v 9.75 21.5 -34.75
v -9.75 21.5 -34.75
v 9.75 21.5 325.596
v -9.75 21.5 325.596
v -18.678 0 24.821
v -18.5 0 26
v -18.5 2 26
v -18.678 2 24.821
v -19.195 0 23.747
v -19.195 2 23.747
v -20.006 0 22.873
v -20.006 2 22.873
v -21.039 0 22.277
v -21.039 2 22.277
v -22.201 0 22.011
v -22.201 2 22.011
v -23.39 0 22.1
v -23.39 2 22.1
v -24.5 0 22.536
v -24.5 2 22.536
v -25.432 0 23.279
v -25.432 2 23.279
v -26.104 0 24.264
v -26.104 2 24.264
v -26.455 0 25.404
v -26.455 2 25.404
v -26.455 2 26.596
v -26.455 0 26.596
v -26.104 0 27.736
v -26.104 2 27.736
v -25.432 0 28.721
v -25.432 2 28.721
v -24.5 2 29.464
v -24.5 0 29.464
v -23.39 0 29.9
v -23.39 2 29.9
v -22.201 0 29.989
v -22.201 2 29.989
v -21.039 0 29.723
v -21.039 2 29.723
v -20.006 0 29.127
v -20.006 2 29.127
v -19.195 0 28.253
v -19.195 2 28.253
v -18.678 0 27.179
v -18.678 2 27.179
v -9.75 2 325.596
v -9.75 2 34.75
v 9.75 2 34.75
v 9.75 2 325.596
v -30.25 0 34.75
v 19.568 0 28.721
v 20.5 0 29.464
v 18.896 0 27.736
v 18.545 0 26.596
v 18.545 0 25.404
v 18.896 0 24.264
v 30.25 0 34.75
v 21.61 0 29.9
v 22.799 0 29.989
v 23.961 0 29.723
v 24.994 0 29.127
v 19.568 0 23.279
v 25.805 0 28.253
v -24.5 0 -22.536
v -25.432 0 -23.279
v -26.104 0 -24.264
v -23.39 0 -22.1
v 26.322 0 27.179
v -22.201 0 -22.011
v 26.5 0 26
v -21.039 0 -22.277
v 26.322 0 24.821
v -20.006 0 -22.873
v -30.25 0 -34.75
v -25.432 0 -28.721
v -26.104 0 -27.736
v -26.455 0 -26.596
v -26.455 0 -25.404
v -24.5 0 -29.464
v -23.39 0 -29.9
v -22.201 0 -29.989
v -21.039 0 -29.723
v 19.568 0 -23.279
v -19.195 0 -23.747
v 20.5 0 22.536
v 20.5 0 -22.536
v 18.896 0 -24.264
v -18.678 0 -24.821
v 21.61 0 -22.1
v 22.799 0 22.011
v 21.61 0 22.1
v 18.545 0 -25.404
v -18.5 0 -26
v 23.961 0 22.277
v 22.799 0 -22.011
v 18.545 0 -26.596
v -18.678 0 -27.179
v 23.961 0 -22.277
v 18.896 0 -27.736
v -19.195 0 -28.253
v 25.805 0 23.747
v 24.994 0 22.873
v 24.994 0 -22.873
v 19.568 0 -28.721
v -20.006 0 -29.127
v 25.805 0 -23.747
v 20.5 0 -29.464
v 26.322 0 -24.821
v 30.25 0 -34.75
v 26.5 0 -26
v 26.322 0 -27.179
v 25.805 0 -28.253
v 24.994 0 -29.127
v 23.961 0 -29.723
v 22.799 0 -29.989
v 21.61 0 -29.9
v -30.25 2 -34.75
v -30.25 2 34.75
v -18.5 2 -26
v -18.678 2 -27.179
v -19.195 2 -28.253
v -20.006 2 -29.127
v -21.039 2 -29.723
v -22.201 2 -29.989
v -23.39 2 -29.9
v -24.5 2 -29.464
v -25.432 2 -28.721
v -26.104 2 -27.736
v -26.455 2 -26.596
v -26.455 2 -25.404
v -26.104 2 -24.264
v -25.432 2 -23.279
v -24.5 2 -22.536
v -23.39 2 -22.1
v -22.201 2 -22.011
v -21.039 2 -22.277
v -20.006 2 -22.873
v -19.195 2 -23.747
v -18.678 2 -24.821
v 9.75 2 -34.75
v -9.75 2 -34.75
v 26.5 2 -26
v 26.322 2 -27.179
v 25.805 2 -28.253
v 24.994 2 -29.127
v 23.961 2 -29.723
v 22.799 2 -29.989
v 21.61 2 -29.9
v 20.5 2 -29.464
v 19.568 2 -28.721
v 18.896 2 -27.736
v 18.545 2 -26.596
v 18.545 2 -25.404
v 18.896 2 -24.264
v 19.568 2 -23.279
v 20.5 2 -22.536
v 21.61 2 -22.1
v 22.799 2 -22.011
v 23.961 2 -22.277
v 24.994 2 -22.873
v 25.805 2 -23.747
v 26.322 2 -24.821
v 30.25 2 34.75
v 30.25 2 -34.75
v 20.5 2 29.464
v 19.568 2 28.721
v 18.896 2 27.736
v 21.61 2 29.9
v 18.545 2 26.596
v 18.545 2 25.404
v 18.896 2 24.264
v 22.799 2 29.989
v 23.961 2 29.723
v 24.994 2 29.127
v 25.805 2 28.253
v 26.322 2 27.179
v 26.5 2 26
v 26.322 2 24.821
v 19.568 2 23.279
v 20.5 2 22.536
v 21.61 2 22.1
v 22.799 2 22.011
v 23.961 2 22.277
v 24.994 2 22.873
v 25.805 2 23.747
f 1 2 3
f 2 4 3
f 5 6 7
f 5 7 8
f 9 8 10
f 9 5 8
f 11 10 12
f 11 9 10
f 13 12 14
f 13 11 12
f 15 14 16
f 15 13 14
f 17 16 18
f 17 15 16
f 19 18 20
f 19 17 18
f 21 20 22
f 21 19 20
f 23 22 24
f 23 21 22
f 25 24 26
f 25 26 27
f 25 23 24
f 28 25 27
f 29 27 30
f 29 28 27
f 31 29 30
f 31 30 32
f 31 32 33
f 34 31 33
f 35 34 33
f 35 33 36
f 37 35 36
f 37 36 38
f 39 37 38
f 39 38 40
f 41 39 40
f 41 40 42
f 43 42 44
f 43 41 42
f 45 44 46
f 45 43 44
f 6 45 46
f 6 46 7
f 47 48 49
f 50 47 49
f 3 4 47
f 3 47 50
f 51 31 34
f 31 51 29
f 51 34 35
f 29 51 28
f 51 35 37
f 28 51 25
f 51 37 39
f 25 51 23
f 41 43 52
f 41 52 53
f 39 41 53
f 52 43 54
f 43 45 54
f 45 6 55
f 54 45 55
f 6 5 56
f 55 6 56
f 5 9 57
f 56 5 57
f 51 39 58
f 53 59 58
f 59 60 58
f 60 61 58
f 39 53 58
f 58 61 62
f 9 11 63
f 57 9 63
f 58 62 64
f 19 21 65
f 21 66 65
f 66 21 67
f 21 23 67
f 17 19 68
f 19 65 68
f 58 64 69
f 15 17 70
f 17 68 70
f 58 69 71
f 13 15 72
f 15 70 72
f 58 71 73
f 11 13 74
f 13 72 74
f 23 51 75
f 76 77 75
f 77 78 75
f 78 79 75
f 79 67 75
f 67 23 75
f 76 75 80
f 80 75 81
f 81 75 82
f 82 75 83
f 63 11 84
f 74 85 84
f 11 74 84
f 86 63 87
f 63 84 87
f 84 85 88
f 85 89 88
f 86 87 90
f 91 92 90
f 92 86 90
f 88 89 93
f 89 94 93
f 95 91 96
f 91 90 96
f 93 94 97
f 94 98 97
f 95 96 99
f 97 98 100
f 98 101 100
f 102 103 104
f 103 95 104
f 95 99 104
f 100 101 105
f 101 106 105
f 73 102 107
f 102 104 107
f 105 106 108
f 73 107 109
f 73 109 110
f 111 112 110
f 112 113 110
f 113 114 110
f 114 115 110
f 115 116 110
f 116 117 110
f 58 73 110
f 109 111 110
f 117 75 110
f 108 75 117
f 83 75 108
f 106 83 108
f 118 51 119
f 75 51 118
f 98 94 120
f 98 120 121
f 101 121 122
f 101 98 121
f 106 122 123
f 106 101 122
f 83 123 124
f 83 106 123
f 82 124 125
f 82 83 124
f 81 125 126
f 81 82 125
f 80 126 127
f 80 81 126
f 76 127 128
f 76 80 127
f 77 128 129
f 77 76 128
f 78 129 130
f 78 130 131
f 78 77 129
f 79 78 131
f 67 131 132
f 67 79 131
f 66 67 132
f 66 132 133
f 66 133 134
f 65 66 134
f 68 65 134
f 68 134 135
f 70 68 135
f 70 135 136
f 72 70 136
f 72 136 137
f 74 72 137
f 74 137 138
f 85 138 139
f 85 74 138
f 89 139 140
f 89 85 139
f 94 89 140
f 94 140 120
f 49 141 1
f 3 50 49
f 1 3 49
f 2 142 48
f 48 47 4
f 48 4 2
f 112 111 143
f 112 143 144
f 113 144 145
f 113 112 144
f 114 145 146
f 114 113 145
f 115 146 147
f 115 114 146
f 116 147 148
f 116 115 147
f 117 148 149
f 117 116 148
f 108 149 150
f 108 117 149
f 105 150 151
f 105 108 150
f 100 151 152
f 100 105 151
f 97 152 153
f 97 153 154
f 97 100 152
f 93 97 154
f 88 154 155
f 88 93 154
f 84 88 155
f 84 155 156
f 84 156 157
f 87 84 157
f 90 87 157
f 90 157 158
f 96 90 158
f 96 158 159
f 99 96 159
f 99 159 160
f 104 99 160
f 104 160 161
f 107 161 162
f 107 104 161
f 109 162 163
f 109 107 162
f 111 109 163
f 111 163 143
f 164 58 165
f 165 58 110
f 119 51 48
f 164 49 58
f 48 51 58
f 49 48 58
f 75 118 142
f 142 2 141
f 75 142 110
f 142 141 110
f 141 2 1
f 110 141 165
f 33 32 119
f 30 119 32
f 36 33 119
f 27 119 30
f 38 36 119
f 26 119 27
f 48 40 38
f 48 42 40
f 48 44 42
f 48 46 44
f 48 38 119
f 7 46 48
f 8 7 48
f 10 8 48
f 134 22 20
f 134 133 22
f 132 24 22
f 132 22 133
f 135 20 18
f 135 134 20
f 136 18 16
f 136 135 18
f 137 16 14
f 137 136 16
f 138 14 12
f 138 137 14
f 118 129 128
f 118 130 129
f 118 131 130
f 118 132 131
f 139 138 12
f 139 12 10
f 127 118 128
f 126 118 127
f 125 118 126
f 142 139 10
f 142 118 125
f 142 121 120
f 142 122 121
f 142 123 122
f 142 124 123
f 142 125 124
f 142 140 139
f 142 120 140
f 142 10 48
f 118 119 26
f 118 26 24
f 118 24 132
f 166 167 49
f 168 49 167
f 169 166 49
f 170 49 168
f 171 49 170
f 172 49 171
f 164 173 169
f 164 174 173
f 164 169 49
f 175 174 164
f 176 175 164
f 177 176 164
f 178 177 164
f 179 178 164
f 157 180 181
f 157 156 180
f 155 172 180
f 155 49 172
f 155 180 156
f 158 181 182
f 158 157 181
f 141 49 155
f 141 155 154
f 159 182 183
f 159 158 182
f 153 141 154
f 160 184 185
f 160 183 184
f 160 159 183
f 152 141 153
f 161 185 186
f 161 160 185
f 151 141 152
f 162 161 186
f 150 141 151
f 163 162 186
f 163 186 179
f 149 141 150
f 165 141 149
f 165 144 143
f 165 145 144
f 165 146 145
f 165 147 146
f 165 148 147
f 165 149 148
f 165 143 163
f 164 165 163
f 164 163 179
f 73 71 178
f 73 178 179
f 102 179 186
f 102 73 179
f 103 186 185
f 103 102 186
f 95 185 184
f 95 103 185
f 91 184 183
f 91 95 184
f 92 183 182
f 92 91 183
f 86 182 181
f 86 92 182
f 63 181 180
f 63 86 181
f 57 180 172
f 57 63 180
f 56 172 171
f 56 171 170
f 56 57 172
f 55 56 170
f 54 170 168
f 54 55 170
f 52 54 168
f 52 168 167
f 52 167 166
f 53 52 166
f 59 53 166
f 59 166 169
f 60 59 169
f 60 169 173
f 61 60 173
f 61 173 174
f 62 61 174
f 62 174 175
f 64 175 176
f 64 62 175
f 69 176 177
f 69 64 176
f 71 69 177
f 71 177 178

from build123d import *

# Parameters (mm, degrees)
SKETCH1_W                = 60.5
SKETCH1_H                = 69.5
SKETCH1_R                = 4
BOSS_EXTRUDE1_DEPTH      = 2
SKETCH2_W                = 19.5
SKETCH2_H                = 19.5
BOSS_EXTRUDE2_DEPTH      = 325.596
BOSS_EXTRUDE2_DEPTH_BACK = 34.75


with BuildPart() as part:
    # Sketch1 → Boss-Extrude1 (new body)
    with BuildSketch(Plane(origin=(0, 0, 0), x_dir=(1, 0, 0), z_dir=(0, 1, 0))):
        Rectangle(SKETCH1_W, SKETCH1_H)
        with Locations((-22.5, 26)):
            Circle(SKETCH1_R, mode=Mode.SUBTRACT)
        with Locations((22.5, 26)):
            Circle(SKETCH1_R, mode=Mode.SUBTRACT)
        with Locations((-22.5, -26)):
            Circle(SKETCH1_R, mode=Mode.SUBTRACT)
        with Locations((22.5, -26)):
            Circle(SKETCH1_R, mode=Mode.SUBTRACT)
    extrude(amount=BOSS_EXTRUDE1_DEPTH)

    # Sketch2 → Boss-Extrude2 (add, two sides)
    with BuildSketch(Plane.XY) as boss_extrude2_sk:
        with Locations((0, 11.75)):
            Rectangle(SKETCH2_W, SKETCH2_H)
    extrude(amount=BOSS_EXTRUDE2_DEPTH)
    extrude(boss_extrude2_sk.sketch, amount=-BOSS_EXTRUDE2_DEPTH_BACK)


solid = part.part
